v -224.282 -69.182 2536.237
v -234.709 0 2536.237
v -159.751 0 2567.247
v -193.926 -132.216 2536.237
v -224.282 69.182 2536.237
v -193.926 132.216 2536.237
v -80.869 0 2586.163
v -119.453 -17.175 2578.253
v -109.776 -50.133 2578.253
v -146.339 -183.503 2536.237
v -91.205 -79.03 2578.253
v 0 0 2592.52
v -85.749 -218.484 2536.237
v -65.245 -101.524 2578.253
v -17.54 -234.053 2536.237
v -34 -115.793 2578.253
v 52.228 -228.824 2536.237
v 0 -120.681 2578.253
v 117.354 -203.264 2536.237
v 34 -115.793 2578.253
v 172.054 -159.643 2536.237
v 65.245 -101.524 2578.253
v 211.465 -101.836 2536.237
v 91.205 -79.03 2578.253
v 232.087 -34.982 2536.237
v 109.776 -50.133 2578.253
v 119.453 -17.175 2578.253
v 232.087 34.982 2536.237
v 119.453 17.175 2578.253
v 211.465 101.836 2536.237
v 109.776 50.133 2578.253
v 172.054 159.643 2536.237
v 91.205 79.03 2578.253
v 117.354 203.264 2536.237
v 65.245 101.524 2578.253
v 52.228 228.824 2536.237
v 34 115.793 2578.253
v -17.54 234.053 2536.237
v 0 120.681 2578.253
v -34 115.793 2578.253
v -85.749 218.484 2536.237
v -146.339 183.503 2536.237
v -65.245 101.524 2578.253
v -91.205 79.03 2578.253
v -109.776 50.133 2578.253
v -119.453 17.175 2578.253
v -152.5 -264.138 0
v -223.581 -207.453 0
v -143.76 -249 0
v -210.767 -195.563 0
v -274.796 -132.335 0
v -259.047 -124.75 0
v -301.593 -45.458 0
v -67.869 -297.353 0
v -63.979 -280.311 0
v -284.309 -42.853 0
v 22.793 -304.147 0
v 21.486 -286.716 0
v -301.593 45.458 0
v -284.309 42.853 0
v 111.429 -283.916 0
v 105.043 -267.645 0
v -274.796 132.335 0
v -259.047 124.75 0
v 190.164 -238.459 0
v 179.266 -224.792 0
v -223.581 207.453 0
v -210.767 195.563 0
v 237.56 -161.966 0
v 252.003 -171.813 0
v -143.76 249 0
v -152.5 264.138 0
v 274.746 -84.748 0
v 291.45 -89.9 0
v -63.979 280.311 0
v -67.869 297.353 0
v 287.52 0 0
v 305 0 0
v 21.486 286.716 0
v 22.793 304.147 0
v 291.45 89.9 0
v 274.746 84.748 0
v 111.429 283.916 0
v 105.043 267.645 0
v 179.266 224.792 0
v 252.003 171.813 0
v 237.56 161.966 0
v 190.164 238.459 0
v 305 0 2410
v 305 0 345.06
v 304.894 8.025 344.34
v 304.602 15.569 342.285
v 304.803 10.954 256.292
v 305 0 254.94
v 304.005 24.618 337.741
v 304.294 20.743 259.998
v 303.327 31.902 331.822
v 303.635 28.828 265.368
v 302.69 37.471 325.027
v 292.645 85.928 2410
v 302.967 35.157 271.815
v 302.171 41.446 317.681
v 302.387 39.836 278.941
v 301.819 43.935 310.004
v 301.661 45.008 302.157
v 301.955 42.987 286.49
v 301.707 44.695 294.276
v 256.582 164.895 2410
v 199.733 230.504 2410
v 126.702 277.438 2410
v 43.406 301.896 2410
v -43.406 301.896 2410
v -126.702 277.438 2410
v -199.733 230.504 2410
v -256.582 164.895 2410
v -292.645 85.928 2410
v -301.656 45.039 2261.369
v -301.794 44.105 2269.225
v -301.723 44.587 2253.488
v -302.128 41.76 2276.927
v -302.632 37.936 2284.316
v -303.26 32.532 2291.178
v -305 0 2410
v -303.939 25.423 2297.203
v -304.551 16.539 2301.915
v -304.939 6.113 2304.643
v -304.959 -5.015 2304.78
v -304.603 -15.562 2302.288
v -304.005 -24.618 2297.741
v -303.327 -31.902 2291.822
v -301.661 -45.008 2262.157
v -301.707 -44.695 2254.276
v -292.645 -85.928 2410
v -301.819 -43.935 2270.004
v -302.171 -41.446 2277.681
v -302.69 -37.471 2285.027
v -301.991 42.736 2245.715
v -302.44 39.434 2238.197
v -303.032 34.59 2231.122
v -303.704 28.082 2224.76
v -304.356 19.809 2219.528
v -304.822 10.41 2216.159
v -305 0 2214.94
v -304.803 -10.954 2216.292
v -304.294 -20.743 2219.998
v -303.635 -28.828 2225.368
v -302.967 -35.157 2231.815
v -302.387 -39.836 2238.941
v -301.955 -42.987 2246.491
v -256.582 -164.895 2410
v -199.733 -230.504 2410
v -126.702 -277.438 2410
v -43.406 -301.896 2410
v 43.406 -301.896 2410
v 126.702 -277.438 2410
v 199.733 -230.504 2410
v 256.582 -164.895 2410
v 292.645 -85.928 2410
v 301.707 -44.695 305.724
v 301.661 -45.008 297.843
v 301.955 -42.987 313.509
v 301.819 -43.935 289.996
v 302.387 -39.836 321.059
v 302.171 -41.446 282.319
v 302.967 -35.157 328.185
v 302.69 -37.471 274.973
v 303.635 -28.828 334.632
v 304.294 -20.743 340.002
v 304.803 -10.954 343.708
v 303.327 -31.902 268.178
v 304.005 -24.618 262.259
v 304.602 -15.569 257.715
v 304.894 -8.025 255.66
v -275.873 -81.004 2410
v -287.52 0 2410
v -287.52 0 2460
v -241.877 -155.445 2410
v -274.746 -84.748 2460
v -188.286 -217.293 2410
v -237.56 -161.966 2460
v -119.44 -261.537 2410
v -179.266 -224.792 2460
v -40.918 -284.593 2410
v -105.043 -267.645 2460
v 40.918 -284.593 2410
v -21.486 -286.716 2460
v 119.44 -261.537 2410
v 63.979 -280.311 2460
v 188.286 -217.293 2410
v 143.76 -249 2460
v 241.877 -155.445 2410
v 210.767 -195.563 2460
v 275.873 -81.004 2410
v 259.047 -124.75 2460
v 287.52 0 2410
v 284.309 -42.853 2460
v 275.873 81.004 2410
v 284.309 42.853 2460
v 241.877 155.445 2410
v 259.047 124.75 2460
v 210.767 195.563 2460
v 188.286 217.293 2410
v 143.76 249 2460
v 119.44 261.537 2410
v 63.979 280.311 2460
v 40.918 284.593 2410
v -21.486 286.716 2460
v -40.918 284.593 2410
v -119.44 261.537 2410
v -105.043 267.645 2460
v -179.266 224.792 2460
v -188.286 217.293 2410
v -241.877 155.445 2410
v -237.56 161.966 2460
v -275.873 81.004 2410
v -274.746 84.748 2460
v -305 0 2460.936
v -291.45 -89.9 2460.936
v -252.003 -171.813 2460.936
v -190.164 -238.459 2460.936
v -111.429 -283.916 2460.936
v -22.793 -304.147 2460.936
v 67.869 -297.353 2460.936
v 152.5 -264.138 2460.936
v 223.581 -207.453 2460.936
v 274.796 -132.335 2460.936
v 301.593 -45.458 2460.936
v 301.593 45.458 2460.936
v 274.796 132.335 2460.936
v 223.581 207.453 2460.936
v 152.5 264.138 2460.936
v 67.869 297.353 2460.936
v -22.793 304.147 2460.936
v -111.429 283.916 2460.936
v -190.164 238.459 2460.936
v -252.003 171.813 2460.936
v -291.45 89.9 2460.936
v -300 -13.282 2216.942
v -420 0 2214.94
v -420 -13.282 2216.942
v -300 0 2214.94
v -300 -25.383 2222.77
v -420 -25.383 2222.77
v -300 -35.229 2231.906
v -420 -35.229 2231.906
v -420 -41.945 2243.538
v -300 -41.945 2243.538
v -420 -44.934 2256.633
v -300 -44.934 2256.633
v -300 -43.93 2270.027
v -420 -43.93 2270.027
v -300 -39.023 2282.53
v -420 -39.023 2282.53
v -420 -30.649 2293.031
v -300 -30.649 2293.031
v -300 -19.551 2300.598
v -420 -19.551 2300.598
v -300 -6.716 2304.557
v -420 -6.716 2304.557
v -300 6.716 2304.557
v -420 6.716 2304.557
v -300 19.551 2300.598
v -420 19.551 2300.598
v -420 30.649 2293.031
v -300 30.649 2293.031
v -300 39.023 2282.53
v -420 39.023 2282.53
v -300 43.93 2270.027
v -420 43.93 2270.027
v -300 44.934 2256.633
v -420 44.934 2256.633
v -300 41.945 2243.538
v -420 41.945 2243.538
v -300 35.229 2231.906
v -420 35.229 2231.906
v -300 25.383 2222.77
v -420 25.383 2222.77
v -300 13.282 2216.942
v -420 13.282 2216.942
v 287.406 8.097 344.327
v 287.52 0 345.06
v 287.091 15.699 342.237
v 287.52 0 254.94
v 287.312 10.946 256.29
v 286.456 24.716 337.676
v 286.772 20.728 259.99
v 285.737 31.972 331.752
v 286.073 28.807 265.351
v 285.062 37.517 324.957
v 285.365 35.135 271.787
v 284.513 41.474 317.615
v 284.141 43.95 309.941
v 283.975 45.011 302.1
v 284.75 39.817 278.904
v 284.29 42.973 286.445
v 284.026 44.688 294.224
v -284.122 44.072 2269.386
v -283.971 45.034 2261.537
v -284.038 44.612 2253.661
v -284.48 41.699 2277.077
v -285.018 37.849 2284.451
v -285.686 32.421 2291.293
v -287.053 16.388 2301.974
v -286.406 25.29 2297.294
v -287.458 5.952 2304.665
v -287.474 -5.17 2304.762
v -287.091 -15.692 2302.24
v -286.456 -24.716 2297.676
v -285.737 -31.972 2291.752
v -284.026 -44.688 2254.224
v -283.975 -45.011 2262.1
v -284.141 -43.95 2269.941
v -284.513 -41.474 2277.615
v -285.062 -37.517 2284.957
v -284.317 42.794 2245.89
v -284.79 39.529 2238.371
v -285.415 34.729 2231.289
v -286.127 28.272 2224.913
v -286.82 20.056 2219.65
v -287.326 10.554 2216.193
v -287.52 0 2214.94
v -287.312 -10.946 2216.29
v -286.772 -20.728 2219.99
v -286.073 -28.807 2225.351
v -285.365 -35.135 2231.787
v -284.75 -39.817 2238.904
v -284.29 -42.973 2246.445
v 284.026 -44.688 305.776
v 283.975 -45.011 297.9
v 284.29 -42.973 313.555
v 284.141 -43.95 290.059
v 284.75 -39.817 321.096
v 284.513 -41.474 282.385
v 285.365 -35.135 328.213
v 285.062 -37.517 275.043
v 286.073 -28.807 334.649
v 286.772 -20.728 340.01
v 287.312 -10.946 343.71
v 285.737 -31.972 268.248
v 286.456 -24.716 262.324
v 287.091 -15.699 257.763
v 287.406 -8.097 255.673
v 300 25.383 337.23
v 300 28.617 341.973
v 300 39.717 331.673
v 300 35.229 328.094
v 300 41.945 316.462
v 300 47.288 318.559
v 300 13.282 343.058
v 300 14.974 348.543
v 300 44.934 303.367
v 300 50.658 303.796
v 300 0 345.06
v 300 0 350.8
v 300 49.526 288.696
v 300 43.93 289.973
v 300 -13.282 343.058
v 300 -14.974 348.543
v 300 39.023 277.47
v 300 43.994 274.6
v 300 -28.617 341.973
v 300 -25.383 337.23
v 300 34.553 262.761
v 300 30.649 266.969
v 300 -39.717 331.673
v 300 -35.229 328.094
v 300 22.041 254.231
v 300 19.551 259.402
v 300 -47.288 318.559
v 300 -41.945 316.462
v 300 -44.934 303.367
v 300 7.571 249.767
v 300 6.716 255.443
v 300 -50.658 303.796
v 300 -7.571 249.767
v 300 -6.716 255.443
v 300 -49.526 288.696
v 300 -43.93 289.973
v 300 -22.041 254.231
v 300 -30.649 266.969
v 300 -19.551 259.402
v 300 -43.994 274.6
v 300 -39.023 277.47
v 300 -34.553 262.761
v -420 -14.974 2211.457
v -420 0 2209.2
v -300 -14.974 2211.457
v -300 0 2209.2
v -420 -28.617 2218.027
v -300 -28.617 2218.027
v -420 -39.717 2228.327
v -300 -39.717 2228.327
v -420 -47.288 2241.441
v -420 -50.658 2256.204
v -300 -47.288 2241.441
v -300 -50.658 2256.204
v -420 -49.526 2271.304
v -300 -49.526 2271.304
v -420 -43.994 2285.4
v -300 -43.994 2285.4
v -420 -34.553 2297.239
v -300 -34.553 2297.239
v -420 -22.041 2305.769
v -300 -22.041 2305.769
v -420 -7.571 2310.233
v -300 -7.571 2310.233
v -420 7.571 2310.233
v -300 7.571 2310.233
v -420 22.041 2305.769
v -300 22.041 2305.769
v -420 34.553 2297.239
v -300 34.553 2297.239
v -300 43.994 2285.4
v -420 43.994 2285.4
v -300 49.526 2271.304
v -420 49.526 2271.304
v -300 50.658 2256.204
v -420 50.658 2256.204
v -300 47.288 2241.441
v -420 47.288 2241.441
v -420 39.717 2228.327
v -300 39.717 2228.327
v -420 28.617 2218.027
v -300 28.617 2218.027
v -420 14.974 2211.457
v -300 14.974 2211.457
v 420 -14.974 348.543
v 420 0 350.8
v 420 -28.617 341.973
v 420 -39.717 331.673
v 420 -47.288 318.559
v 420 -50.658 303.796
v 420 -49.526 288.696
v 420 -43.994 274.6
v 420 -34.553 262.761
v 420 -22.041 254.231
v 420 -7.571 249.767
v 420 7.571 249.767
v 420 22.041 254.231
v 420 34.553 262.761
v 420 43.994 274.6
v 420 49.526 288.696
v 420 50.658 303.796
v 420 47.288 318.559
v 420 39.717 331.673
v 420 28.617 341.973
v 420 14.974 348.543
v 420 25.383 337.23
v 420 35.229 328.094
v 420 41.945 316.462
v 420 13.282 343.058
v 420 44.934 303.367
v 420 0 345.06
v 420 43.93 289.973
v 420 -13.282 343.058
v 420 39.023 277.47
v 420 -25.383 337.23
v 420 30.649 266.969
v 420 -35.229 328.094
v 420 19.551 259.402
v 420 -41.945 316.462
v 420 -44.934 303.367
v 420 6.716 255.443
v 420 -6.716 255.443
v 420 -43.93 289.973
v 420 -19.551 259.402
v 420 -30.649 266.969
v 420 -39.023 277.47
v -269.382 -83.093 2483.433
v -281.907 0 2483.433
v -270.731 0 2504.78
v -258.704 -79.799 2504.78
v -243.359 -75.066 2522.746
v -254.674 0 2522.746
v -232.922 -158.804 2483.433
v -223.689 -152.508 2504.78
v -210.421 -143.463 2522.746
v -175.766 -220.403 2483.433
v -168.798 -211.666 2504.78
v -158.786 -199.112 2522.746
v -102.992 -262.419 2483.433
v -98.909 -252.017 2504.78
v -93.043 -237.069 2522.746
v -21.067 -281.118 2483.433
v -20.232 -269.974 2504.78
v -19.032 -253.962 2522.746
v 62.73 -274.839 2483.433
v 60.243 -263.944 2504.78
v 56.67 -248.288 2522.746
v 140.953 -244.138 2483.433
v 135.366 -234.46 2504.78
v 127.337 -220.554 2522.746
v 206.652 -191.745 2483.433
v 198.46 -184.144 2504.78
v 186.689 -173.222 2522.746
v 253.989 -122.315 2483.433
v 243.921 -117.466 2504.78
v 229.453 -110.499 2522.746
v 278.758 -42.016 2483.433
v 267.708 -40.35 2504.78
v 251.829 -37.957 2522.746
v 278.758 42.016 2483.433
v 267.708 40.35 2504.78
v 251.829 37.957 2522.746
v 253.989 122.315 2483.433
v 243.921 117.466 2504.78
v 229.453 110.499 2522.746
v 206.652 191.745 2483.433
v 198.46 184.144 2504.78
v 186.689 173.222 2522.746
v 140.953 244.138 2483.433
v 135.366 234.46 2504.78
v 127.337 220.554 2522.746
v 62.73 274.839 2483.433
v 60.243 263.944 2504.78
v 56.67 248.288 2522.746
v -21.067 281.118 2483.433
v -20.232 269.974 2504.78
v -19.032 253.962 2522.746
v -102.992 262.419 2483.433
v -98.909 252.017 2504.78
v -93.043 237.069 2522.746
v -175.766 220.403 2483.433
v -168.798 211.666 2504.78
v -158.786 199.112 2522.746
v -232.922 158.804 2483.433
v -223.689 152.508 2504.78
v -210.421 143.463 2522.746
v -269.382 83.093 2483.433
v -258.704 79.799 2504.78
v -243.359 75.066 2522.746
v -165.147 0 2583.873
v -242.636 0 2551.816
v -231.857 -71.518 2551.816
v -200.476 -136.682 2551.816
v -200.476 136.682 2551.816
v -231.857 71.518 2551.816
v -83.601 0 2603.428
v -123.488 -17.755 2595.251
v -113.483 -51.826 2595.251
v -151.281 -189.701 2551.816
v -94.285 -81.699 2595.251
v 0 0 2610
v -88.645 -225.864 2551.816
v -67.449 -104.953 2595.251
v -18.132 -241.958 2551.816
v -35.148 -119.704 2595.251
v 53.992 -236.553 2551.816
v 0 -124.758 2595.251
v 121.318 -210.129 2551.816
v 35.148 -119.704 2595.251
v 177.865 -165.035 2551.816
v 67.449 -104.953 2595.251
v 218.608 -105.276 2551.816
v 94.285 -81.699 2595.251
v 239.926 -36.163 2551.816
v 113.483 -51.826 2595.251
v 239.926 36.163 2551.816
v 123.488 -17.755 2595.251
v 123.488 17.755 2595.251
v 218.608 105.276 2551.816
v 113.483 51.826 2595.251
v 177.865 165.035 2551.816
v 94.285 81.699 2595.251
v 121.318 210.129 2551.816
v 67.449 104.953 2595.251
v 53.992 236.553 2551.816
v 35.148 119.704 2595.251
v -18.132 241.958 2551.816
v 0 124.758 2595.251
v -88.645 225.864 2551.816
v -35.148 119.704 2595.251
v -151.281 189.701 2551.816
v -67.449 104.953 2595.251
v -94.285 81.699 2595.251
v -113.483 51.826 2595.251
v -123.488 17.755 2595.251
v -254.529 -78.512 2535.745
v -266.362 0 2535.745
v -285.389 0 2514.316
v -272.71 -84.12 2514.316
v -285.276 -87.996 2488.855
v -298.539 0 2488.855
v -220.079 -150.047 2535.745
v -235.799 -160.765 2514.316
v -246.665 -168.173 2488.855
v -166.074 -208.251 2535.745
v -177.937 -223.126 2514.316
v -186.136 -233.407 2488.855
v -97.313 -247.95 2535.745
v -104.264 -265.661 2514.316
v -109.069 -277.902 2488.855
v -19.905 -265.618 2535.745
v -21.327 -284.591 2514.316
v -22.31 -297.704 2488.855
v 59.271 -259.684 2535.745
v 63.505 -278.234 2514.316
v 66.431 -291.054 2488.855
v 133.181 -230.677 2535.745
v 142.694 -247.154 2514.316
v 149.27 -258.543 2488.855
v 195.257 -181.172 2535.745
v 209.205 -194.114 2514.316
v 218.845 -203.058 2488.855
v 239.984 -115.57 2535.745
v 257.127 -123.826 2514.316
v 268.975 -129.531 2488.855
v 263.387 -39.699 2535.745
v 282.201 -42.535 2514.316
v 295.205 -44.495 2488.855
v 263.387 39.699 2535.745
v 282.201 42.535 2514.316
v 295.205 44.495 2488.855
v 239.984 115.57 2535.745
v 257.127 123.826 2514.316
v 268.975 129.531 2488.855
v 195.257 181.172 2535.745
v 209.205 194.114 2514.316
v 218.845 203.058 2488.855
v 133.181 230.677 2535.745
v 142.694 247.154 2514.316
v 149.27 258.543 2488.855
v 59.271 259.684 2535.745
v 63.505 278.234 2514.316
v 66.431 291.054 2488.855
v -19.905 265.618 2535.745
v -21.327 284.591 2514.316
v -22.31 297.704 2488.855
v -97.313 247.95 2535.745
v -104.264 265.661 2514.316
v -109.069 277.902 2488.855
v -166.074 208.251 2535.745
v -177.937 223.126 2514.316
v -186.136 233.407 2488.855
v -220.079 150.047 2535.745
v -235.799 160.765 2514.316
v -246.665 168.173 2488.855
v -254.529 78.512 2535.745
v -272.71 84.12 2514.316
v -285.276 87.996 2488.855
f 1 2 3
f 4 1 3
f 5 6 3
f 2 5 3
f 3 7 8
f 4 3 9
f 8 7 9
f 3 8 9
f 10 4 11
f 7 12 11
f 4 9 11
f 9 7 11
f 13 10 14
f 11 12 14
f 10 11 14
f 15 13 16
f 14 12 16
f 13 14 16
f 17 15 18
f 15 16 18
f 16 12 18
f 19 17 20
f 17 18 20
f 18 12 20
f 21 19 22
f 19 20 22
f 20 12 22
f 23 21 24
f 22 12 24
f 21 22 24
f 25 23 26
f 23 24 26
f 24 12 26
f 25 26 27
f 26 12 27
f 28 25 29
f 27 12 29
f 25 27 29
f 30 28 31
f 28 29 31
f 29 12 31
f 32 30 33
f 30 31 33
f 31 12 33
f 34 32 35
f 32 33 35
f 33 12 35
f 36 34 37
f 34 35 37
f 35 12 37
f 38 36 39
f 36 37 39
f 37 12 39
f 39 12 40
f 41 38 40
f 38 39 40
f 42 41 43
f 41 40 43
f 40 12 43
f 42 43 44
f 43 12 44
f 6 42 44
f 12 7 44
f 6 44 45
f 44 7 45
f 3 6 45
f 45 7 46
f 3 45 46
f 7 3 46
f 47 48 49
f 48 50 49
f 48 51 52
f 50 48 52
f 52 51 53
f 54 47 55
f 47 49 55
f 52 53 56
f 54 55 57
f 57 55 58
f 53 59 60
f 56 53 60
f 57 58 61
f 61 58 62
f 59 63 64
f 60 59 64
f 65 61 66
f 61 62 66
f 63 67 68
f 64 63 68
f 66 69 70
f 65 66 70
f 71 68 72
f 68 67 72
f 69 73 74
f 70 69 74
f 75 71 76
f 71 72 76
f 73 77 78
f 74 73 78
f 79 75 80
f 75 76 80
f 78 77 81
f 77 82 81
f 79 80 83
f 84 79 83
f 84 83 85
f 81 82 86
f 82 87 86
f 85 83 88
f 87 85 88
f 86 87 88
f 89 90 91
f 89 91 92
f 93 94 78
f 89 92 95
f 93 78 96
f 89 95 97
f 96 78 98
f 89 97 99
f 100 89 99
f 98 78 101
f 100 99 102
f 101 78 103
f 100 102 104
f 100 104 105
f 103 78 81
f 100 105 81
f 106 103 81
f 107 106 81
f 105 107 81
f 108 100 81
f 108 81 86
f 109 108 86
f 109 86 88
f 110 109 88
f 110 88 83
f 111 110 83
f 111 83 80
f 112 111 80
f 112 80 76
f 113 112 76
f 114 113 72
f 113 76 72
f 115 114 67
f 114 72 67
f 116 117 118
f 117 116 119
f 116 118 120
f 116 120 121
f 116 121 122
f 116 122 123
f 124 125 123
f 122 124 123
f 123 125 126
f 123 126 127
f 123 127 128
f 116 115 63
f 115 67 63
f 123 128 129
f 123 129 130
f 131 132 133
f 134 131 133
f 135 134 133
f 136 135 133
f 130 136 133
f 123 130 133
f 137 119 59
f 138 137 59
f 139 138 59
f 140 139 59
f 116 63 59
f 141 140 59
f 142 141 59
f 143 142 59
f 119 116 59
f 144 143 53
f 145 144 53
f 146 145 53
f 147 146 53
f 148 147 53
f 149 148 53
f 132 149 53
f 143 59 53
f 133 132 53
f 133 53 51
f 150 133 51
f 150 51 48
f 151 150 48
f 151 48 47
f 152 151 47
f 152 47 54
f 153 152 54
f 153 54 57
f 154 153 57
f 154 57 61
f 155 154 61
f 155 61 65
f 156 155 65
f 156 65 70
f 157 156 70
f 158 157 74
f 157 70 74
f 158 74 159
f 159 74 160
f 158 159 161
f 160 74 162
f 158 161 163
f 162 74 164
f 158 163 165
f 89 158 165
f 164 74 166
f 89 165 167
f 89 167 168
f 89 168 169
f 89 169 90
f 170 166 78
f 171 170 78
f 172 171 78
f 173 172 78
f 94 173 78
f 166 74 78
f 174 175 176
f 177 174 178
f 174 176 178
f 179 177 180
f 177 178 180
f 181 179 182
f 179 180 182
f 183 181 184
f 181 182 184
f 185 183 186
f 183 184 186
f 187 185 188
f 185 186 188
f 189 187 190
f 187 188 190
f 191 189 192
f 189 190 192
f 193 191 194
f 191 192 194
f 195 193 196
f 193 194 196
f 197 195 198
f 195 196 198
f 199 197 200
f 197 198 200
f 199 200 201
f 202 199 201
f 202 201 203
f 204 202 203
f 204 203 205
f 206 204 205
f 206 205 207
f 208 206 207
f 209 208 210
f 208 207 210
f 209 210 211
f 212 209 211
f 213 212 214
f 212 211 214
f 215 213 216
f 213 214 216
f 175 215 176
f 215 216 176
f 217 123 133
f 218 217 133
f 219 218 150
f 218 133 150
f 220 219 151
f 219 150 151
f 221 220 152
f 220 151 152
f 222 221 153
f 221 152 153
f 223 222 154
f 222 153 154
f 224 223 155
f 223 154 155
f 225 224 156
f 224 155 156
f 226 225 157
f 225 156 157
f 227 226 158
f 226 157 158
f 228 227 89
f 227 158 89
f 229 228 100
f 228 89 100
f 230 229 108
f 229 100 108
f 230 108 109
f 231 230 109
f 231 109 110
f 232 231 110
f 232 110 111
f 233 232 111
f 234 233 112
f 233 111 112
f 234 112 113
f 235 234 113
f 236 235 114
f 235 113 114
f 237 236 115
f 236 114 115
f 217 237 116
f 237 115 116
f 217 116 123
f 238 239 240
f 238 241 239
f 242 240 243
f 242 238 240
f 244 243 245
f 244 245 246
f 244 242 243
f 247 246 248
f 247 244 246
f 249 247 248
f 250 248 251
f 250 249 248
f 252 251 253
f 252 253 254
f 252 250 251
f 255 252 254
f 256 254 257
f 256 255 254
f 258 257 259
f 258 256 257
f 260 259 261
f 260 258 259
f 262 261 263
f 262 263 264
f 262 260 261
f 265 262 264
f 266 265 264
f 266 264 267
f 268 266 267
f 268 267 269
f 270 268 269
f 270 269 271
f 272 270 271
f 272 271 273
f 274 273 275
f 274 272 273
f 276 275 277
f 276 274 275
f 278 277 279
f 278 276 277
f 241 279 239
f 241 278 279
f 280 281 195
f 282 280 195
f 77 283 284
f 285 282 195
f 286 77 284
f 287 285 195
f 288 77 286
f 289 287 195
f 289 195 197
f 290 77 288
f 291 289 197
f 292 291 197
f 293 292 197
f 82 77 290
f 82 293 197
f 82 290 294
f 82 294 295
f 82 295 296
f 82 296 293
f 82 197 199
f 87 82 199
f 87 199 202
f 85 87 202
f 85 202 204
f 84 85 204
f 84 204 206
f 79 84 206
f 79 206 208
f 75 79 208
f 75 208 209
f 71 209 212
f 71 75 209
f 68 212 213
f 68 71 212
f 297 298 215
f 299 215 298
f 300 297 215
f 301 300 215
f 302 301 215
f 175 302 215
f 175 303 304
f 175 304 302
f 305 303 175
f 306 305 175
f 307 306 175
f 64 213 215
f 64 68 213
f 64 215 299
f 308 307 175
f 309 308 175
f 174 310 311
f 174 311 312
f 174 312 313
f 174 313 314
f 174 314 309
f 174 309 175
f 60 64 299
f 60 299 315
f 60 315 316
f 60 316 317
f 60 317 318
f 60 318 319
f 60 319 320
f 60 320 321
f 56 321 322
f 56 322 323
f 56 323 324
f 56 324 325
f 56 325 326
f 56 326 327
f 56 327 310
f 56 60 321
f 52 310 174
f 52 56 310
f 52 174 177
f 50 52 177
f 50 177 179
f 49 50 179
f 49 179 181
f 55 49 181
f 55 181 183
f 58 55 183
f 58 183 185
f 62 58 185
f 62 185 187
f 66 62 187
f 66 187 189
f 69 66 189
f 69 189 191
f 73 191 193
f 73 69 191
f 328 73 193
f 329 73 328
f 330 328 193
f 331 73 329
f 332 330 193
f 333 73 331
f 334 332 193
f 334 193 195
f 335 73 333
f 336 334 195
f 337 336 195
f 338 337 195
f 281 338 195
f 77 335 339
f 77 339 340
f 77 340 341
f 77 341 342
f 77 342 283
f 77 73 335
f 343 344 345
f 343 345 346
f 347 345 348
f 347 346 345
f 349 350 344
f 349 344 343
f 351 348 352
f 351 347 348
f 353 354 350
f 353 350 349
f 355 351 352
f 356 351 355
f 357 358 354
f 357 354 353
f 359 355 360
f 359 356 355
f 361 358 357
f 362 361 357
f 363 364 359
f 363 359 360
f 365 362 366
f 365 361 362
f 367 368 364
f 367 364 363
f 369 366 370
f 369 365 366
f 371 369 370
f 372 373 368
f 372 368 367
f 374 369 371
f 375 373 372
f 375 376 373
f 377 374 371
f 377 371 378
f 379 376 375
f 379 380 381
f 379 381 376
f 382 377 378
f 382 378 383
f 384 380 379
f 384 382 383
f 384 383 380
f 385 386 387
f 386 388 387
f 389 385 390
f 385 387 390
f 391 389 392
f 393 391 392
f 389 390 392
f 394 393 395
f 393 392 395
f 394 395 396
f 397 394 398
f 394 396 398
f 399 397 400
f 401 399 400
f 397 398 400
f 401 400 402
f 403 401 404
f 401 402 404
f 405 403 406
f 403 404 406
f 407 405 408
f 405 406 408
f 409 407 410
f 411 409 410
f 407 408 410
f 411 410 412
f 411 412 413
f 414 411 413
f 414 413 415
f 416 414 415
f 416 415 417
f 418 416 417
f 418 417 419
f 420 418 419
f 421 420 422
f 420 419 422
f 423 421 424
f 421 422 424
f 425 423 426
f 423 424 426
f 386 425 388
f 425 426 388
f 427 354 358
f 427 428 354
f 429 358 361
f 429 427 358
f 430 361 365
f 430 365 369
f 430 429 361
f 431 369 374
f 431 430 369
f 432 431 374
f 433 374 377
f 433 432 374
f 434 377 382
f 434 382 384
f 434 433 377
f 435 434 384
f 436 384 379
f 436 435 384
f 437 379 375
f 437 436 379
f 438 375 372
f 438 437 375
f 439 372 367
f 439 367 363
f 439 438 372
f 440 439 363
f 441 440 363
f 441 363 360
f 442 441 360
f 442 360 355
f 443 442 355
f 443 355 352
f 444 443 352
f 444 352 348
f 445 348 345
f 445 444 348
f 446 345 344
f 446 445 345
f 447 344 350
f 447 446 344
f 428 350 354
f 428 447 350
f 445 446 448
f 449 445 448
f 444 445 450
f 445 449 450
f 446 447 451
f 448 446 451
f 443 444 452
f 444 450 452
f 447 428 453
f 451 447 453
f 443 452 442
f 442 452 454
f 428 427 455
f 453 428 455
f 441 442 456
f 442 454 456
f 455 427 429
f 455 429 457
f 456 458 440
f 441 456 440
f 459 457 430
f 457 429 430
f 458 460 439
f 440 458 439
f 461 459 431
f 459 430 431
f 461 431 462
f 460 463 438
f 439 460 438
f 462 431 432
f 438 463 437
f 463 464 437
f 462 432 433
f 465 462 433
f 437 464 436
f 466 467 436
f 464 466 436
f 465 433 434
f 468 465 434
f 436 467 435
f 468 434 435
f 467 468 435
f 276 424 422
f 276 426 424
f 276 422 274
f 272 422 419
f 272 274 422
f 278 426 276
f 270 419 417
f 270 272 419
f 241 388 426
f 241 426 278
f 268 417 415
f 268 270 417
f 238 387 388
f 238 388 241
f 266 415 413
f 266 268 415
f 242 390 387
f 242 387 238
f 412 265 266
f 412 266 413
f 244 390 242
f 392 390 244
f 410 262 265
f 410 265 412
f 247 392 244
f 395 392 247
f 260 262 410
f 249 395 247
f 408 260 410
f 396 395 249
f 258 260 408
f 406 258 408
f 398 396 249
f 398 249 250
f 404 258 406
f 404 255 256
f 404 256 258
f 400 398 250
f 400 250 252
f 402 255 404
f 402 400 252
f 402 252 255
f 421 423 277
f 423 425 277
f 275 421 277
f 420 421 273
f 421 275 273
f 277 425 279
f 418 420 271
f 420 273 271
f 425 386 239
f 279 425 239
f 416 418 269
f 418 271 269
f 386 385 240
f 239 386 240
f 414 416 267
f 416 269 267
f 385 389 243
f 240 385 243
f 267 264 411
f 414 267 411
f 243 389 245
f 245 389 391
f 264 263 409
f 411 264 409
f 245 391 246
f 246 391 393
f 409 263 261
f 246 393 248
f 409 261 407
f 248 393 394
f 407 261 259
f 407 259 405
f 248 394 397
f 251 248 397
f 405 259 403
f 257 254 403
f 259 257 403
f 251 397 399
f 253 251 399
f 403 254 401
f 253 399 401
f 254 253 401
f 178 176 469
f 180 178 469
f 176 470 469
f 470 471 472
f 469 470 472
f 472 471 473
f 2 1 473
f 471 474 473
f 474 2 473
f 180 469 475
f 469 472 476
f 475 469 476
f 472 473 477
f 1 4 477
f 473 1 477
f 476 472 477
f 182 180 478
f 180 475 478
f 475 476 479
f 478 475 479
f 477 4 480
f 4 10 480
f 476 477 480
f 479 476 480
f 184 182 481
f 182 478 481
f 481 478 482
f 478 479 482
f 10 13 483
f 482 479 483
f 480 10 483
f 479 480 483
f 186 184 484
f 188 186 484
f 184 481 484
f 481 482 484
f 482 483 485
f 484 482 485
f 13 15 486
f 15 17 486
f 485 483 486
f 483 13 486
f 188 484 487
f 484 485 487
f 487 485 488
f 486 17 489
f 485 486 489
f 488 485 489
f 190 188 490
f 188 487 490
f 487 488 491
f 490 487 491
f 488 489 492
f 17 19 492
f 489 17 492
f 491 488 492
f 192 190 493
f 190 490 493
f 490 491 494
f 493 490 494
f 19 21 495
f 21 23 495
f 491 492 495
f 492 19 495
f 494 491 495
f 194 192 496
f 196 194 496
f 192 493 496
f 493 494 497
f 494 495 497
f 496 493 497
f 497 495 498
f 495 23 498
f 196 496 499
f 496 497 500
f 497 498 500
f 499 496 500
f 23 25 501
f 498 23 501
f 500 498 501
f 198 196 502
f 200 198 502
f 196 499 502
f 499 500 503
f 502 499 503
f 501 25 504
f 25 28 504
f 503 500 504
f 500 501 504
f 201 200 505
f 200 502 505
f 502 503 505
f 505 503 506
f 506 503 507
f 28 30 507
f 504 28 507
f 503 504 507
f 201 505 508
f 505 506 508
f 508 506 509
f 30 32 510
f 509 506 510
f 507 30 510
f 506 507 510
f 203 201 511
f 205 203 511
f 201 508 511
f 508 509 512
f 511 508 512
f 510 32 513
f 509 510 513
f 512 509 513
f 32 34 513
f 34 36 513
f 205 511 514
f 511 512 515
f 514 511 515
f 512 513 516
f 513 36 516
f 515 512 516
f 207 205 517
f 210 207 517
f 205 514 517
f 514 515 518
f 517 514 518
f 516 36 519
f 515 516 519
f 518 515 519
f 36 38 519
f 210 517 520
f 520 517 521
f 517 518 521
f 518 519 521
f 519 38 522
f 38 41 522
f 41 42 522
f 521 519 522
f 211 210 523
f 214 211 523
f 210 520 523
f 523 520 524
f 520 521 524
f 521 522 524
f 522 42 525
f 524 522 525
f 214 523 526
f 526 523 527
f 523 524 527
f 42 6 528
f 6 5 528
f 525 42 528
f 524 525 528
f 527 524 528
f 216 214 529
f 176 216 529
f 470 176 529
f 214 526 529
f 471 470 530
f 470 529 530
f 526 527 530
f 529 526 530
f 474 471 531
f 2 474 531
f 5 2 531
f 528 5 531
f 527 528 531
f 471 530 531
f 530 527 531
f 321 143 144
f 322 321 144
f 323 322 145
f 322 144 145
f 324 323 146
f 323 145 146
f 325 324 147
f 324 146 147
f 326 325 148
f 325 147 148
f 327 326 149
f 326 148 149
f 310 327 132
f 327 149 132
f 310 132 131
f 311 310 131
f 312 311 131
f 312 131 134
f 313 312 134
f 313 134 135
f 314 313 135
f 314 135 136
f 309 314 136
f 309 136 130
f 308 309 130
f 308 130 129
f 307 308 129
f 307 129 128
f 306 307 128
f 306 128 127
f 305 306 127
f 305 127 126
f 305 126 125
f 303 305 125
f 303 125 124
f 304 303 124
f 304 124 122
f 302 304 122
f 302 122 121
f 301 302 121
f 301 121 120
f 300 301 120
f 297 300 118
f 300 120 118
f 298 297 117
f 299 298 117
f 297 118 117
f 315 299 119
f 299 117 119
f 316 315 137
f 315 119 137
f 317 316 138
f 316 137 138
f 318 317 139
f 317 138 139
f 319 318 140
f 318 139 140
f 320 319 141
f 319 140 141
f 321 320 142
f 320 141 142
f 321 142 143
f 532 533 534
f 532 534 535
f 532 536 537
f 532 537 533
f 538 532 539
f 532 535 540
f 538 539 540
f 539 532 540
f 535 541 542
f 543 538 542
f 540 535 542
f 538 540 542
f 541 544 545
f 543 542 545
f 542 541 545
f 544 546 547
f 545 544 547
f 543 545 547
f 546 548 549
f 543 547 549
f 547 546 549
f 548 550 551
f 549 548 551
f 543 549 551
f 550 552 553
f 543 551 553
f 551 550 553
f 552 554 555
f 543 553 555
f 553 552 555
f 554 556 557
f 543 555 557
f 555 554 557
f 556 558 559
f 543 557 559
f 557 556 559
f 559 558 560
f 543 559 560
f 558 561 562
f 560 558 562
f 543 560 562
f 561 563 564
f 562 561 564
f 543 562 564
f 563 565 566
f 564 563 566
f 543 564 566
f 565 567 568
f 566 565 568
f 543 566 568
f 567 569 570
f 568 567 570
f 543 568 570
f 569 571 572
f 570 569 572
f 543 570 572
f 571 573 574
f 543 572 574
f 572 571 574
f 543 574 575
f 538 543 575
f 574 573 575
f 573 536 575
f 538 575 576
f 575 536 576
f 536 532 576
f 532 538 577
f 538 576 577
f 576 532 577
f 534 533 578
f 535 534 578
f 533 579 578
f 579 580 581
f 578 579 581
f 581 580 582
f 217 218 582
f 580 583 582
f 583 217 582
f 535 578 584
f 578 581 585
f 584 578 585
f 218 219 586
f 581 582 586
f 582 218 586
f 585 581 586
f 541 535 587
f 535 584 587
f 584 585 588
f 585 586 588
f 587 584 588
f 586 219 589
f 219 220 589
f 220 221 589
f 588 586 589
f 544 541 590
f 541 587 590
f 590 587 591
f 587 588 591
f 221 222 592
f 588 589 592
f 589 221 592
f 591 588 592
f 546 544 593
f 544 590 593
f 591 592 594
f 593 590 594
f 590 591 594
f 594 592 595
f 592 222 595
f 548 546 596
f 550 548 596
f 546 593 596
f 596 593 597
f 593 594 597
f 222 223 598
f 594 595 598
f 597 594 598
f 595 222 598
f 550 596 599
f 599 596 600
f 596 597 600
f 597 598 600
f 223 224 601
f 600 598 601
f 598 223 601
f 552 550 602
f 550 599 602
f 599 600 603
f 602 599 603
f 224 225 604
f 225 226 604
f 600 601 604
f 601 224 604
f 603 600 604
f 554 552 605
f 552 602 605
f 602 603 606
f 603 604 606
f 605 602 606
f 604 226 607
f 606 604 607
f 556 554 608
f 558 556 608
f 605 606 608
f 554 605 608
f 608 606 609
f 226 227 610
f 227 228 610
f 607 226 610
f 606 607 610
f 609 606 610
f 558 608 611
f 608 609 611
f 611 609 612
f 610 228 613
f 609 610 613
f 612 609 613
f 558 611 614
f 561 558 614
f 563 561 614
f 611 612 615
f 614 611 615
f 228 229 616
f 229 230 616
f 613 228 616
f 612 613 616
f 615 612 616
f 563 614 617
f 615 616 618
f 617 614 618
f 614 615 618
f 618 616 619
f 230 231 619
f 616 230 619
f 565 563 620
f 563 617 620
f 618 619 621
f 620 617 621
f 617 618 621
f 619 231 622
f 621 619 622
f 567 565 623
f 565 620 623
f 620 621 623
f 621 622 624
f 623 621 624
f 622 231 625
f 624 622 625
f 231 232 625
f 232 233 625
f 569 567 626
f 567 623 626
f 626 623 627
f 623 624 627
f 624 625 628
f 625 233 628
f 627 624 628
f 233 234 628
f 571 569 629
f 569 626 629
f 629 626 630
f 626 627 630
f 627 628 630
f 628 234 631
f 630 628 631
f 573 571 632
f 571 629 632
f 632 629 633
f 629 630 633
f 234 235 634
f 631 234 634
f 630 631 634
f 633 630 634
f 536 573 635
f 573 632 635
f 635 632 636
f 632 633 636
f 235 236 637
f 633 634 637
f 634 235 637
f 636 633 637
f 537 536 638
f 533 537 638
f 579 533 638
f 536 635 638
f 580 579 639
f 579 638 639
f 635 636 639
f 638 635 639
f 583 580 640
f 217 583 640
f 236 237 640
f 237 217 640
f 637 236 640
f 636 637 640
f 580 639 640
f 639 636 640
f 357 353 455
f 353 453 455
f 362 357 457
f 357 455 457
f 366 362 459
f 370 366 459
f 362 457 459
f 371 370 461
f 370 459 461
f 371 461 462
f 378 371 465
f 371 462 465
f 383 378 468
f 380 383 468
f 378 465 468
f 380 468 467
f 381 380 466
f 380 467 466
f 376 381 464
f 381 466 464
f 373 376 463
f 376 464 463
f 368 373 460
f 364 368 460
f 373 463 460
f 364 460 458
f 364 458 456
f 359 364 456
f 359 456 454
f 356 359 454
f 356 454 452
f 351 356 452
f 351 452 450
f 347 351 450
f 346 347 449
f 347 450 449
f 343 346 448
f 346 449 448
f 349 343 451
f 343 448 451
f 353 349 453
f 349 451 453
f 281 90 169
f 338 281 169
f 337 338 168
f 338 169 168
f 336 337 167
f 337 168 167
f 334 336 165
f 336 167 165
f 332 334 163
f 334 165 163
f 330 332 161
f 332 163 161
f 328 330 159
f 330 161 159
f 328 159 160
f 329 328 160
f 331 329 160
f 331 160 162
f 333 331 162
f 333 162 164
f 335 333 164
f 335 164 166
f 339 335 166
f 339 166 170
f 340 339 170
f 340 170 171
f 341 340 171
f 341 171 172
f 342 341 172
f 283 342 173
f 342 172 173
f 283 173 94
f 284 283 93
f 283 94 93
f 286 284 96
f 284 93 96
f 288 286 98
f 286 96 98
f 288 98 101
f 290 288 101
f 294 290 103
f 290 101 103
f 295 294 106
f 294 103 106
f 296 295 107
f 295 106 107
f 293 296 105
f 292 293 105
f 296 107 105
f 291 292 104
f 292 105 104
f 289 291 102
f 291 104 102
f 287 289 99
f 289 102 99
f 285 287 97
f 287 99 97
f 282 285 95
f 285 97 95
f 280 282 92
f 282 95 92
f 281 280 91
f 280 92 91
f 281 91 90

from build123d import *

# Parameters (mm, degrees)
SKETCH1_R           = 305
SKETCH1_R_2         = 287.52
BOSS_EXTRUDE1_DEPTH = 2410
SKETCH3_W           = 120
SKETCH3_H           = 5.74
SKETCH4_W           = 120
SKETCH4_H           = 5.74
SKETCH5_R           = 45.06
CUT_EXTRUDE1_DEPTH  = 366
SKETCH6_R           = 45.06
CUT_EXTRUDE2_DEPTH  = 366


with BuildPart() as part:
    # Sketch1 → Boss-Extrude1 (new body)
    with BuildSketch(Plane.XY):
        Circle(SKETCH1_R)
        Circle(SKETCH1_R_2, mode=Mode.SUBTRACT)
    extrude(amount=BOSS_EXTRUDE1_DEPTH)

    # Sketch2 → Revolve1 (revolve)
    with BuildSketch(Plane(origin=(0, 0, 0), x_dir=(1, 0, 0), z_dir=(0, 1, 0))):
        with BuildLine():
            Line((287.52, -2410), (287.52, -2460))
            ThreePointArc((287.52, -2460), (270.731420067, -2504.780446806), (234.708977843, -2536.23721855))
            ThreePointArc((234.708977843, -2536.23721855), (120.681456496, -2578.252642124), (0, -2592.52))
            Line((0, -2592.52), (0, -2610))
            ThreePointArc((0, -2610), (124.757571619, -2595.250750416), (242.636465974, -2551.816221468))
            ThreePointArc((242.636465974, -2551.816221468), (285.388930418, -2514.315997098), (305, -2460.935794835))
            Line((305, -2460.935794835), (305, -2410))
            Line((305, -2410), (287.52, -2410))
        make_face()
    revolve(axis=Axis((0, 0, 0), (0, 0, 1)))

    # Sketch5 → Cut-Extrude1 (cut)
    with BuildSketch(Plane(origin=(420, 0, 0), x_dir=(0, 0, -1), z_dir=(1, 0, 0))):
        with Locations((-300, 0)):
            Circle(SKETCH5_R)
    extrude(amount=-CUT_EXTRUDE1_DEPTH, mode=Mode.SUBTRACT)

    # Sketch6 → Cut-Extrude2 (cut)
    with BuildSketch(Plane.ZY.offset(420)):
        with Locations((2260, 0)):
            Circle(SKETCH6_R)
    extrude(amount=-CUT_EXTRUDE2_DEPTH, mode=Mode.SUBTRACT)


with BuildPart() as body_2:
    # Sketch3 → Revolve2 (revolve)
    with BuildSketch(Plane(origin=(0, 0, 0), x_dir=(1, 0, 0), z_dir=(0, 1, 0))):
        with Locations((360, -252.07)):
            Rectangle(SKETCH3_W, SKETCH3_H)
    revolve(axis=Axis((305, 0, 300), (1, 0, 0)))


with BuildPart() as body_3:
    # Sketch4 → Revolve3 (revolve)
    with BuildSketch(Plane(origin=(0, 0, 0), x_dir=(1, 0, 0), z_dir=(0, 1, 0))):
        with Locations((-360, -2212.07)):
            Rectangle(SKETCH4_W, SKETCH4_H)
    revolve(axis=Axis((-305, 0, 2260), (-1, 0, 0)))


solid = Compound([part.part, body_2.part, body_3.part])
